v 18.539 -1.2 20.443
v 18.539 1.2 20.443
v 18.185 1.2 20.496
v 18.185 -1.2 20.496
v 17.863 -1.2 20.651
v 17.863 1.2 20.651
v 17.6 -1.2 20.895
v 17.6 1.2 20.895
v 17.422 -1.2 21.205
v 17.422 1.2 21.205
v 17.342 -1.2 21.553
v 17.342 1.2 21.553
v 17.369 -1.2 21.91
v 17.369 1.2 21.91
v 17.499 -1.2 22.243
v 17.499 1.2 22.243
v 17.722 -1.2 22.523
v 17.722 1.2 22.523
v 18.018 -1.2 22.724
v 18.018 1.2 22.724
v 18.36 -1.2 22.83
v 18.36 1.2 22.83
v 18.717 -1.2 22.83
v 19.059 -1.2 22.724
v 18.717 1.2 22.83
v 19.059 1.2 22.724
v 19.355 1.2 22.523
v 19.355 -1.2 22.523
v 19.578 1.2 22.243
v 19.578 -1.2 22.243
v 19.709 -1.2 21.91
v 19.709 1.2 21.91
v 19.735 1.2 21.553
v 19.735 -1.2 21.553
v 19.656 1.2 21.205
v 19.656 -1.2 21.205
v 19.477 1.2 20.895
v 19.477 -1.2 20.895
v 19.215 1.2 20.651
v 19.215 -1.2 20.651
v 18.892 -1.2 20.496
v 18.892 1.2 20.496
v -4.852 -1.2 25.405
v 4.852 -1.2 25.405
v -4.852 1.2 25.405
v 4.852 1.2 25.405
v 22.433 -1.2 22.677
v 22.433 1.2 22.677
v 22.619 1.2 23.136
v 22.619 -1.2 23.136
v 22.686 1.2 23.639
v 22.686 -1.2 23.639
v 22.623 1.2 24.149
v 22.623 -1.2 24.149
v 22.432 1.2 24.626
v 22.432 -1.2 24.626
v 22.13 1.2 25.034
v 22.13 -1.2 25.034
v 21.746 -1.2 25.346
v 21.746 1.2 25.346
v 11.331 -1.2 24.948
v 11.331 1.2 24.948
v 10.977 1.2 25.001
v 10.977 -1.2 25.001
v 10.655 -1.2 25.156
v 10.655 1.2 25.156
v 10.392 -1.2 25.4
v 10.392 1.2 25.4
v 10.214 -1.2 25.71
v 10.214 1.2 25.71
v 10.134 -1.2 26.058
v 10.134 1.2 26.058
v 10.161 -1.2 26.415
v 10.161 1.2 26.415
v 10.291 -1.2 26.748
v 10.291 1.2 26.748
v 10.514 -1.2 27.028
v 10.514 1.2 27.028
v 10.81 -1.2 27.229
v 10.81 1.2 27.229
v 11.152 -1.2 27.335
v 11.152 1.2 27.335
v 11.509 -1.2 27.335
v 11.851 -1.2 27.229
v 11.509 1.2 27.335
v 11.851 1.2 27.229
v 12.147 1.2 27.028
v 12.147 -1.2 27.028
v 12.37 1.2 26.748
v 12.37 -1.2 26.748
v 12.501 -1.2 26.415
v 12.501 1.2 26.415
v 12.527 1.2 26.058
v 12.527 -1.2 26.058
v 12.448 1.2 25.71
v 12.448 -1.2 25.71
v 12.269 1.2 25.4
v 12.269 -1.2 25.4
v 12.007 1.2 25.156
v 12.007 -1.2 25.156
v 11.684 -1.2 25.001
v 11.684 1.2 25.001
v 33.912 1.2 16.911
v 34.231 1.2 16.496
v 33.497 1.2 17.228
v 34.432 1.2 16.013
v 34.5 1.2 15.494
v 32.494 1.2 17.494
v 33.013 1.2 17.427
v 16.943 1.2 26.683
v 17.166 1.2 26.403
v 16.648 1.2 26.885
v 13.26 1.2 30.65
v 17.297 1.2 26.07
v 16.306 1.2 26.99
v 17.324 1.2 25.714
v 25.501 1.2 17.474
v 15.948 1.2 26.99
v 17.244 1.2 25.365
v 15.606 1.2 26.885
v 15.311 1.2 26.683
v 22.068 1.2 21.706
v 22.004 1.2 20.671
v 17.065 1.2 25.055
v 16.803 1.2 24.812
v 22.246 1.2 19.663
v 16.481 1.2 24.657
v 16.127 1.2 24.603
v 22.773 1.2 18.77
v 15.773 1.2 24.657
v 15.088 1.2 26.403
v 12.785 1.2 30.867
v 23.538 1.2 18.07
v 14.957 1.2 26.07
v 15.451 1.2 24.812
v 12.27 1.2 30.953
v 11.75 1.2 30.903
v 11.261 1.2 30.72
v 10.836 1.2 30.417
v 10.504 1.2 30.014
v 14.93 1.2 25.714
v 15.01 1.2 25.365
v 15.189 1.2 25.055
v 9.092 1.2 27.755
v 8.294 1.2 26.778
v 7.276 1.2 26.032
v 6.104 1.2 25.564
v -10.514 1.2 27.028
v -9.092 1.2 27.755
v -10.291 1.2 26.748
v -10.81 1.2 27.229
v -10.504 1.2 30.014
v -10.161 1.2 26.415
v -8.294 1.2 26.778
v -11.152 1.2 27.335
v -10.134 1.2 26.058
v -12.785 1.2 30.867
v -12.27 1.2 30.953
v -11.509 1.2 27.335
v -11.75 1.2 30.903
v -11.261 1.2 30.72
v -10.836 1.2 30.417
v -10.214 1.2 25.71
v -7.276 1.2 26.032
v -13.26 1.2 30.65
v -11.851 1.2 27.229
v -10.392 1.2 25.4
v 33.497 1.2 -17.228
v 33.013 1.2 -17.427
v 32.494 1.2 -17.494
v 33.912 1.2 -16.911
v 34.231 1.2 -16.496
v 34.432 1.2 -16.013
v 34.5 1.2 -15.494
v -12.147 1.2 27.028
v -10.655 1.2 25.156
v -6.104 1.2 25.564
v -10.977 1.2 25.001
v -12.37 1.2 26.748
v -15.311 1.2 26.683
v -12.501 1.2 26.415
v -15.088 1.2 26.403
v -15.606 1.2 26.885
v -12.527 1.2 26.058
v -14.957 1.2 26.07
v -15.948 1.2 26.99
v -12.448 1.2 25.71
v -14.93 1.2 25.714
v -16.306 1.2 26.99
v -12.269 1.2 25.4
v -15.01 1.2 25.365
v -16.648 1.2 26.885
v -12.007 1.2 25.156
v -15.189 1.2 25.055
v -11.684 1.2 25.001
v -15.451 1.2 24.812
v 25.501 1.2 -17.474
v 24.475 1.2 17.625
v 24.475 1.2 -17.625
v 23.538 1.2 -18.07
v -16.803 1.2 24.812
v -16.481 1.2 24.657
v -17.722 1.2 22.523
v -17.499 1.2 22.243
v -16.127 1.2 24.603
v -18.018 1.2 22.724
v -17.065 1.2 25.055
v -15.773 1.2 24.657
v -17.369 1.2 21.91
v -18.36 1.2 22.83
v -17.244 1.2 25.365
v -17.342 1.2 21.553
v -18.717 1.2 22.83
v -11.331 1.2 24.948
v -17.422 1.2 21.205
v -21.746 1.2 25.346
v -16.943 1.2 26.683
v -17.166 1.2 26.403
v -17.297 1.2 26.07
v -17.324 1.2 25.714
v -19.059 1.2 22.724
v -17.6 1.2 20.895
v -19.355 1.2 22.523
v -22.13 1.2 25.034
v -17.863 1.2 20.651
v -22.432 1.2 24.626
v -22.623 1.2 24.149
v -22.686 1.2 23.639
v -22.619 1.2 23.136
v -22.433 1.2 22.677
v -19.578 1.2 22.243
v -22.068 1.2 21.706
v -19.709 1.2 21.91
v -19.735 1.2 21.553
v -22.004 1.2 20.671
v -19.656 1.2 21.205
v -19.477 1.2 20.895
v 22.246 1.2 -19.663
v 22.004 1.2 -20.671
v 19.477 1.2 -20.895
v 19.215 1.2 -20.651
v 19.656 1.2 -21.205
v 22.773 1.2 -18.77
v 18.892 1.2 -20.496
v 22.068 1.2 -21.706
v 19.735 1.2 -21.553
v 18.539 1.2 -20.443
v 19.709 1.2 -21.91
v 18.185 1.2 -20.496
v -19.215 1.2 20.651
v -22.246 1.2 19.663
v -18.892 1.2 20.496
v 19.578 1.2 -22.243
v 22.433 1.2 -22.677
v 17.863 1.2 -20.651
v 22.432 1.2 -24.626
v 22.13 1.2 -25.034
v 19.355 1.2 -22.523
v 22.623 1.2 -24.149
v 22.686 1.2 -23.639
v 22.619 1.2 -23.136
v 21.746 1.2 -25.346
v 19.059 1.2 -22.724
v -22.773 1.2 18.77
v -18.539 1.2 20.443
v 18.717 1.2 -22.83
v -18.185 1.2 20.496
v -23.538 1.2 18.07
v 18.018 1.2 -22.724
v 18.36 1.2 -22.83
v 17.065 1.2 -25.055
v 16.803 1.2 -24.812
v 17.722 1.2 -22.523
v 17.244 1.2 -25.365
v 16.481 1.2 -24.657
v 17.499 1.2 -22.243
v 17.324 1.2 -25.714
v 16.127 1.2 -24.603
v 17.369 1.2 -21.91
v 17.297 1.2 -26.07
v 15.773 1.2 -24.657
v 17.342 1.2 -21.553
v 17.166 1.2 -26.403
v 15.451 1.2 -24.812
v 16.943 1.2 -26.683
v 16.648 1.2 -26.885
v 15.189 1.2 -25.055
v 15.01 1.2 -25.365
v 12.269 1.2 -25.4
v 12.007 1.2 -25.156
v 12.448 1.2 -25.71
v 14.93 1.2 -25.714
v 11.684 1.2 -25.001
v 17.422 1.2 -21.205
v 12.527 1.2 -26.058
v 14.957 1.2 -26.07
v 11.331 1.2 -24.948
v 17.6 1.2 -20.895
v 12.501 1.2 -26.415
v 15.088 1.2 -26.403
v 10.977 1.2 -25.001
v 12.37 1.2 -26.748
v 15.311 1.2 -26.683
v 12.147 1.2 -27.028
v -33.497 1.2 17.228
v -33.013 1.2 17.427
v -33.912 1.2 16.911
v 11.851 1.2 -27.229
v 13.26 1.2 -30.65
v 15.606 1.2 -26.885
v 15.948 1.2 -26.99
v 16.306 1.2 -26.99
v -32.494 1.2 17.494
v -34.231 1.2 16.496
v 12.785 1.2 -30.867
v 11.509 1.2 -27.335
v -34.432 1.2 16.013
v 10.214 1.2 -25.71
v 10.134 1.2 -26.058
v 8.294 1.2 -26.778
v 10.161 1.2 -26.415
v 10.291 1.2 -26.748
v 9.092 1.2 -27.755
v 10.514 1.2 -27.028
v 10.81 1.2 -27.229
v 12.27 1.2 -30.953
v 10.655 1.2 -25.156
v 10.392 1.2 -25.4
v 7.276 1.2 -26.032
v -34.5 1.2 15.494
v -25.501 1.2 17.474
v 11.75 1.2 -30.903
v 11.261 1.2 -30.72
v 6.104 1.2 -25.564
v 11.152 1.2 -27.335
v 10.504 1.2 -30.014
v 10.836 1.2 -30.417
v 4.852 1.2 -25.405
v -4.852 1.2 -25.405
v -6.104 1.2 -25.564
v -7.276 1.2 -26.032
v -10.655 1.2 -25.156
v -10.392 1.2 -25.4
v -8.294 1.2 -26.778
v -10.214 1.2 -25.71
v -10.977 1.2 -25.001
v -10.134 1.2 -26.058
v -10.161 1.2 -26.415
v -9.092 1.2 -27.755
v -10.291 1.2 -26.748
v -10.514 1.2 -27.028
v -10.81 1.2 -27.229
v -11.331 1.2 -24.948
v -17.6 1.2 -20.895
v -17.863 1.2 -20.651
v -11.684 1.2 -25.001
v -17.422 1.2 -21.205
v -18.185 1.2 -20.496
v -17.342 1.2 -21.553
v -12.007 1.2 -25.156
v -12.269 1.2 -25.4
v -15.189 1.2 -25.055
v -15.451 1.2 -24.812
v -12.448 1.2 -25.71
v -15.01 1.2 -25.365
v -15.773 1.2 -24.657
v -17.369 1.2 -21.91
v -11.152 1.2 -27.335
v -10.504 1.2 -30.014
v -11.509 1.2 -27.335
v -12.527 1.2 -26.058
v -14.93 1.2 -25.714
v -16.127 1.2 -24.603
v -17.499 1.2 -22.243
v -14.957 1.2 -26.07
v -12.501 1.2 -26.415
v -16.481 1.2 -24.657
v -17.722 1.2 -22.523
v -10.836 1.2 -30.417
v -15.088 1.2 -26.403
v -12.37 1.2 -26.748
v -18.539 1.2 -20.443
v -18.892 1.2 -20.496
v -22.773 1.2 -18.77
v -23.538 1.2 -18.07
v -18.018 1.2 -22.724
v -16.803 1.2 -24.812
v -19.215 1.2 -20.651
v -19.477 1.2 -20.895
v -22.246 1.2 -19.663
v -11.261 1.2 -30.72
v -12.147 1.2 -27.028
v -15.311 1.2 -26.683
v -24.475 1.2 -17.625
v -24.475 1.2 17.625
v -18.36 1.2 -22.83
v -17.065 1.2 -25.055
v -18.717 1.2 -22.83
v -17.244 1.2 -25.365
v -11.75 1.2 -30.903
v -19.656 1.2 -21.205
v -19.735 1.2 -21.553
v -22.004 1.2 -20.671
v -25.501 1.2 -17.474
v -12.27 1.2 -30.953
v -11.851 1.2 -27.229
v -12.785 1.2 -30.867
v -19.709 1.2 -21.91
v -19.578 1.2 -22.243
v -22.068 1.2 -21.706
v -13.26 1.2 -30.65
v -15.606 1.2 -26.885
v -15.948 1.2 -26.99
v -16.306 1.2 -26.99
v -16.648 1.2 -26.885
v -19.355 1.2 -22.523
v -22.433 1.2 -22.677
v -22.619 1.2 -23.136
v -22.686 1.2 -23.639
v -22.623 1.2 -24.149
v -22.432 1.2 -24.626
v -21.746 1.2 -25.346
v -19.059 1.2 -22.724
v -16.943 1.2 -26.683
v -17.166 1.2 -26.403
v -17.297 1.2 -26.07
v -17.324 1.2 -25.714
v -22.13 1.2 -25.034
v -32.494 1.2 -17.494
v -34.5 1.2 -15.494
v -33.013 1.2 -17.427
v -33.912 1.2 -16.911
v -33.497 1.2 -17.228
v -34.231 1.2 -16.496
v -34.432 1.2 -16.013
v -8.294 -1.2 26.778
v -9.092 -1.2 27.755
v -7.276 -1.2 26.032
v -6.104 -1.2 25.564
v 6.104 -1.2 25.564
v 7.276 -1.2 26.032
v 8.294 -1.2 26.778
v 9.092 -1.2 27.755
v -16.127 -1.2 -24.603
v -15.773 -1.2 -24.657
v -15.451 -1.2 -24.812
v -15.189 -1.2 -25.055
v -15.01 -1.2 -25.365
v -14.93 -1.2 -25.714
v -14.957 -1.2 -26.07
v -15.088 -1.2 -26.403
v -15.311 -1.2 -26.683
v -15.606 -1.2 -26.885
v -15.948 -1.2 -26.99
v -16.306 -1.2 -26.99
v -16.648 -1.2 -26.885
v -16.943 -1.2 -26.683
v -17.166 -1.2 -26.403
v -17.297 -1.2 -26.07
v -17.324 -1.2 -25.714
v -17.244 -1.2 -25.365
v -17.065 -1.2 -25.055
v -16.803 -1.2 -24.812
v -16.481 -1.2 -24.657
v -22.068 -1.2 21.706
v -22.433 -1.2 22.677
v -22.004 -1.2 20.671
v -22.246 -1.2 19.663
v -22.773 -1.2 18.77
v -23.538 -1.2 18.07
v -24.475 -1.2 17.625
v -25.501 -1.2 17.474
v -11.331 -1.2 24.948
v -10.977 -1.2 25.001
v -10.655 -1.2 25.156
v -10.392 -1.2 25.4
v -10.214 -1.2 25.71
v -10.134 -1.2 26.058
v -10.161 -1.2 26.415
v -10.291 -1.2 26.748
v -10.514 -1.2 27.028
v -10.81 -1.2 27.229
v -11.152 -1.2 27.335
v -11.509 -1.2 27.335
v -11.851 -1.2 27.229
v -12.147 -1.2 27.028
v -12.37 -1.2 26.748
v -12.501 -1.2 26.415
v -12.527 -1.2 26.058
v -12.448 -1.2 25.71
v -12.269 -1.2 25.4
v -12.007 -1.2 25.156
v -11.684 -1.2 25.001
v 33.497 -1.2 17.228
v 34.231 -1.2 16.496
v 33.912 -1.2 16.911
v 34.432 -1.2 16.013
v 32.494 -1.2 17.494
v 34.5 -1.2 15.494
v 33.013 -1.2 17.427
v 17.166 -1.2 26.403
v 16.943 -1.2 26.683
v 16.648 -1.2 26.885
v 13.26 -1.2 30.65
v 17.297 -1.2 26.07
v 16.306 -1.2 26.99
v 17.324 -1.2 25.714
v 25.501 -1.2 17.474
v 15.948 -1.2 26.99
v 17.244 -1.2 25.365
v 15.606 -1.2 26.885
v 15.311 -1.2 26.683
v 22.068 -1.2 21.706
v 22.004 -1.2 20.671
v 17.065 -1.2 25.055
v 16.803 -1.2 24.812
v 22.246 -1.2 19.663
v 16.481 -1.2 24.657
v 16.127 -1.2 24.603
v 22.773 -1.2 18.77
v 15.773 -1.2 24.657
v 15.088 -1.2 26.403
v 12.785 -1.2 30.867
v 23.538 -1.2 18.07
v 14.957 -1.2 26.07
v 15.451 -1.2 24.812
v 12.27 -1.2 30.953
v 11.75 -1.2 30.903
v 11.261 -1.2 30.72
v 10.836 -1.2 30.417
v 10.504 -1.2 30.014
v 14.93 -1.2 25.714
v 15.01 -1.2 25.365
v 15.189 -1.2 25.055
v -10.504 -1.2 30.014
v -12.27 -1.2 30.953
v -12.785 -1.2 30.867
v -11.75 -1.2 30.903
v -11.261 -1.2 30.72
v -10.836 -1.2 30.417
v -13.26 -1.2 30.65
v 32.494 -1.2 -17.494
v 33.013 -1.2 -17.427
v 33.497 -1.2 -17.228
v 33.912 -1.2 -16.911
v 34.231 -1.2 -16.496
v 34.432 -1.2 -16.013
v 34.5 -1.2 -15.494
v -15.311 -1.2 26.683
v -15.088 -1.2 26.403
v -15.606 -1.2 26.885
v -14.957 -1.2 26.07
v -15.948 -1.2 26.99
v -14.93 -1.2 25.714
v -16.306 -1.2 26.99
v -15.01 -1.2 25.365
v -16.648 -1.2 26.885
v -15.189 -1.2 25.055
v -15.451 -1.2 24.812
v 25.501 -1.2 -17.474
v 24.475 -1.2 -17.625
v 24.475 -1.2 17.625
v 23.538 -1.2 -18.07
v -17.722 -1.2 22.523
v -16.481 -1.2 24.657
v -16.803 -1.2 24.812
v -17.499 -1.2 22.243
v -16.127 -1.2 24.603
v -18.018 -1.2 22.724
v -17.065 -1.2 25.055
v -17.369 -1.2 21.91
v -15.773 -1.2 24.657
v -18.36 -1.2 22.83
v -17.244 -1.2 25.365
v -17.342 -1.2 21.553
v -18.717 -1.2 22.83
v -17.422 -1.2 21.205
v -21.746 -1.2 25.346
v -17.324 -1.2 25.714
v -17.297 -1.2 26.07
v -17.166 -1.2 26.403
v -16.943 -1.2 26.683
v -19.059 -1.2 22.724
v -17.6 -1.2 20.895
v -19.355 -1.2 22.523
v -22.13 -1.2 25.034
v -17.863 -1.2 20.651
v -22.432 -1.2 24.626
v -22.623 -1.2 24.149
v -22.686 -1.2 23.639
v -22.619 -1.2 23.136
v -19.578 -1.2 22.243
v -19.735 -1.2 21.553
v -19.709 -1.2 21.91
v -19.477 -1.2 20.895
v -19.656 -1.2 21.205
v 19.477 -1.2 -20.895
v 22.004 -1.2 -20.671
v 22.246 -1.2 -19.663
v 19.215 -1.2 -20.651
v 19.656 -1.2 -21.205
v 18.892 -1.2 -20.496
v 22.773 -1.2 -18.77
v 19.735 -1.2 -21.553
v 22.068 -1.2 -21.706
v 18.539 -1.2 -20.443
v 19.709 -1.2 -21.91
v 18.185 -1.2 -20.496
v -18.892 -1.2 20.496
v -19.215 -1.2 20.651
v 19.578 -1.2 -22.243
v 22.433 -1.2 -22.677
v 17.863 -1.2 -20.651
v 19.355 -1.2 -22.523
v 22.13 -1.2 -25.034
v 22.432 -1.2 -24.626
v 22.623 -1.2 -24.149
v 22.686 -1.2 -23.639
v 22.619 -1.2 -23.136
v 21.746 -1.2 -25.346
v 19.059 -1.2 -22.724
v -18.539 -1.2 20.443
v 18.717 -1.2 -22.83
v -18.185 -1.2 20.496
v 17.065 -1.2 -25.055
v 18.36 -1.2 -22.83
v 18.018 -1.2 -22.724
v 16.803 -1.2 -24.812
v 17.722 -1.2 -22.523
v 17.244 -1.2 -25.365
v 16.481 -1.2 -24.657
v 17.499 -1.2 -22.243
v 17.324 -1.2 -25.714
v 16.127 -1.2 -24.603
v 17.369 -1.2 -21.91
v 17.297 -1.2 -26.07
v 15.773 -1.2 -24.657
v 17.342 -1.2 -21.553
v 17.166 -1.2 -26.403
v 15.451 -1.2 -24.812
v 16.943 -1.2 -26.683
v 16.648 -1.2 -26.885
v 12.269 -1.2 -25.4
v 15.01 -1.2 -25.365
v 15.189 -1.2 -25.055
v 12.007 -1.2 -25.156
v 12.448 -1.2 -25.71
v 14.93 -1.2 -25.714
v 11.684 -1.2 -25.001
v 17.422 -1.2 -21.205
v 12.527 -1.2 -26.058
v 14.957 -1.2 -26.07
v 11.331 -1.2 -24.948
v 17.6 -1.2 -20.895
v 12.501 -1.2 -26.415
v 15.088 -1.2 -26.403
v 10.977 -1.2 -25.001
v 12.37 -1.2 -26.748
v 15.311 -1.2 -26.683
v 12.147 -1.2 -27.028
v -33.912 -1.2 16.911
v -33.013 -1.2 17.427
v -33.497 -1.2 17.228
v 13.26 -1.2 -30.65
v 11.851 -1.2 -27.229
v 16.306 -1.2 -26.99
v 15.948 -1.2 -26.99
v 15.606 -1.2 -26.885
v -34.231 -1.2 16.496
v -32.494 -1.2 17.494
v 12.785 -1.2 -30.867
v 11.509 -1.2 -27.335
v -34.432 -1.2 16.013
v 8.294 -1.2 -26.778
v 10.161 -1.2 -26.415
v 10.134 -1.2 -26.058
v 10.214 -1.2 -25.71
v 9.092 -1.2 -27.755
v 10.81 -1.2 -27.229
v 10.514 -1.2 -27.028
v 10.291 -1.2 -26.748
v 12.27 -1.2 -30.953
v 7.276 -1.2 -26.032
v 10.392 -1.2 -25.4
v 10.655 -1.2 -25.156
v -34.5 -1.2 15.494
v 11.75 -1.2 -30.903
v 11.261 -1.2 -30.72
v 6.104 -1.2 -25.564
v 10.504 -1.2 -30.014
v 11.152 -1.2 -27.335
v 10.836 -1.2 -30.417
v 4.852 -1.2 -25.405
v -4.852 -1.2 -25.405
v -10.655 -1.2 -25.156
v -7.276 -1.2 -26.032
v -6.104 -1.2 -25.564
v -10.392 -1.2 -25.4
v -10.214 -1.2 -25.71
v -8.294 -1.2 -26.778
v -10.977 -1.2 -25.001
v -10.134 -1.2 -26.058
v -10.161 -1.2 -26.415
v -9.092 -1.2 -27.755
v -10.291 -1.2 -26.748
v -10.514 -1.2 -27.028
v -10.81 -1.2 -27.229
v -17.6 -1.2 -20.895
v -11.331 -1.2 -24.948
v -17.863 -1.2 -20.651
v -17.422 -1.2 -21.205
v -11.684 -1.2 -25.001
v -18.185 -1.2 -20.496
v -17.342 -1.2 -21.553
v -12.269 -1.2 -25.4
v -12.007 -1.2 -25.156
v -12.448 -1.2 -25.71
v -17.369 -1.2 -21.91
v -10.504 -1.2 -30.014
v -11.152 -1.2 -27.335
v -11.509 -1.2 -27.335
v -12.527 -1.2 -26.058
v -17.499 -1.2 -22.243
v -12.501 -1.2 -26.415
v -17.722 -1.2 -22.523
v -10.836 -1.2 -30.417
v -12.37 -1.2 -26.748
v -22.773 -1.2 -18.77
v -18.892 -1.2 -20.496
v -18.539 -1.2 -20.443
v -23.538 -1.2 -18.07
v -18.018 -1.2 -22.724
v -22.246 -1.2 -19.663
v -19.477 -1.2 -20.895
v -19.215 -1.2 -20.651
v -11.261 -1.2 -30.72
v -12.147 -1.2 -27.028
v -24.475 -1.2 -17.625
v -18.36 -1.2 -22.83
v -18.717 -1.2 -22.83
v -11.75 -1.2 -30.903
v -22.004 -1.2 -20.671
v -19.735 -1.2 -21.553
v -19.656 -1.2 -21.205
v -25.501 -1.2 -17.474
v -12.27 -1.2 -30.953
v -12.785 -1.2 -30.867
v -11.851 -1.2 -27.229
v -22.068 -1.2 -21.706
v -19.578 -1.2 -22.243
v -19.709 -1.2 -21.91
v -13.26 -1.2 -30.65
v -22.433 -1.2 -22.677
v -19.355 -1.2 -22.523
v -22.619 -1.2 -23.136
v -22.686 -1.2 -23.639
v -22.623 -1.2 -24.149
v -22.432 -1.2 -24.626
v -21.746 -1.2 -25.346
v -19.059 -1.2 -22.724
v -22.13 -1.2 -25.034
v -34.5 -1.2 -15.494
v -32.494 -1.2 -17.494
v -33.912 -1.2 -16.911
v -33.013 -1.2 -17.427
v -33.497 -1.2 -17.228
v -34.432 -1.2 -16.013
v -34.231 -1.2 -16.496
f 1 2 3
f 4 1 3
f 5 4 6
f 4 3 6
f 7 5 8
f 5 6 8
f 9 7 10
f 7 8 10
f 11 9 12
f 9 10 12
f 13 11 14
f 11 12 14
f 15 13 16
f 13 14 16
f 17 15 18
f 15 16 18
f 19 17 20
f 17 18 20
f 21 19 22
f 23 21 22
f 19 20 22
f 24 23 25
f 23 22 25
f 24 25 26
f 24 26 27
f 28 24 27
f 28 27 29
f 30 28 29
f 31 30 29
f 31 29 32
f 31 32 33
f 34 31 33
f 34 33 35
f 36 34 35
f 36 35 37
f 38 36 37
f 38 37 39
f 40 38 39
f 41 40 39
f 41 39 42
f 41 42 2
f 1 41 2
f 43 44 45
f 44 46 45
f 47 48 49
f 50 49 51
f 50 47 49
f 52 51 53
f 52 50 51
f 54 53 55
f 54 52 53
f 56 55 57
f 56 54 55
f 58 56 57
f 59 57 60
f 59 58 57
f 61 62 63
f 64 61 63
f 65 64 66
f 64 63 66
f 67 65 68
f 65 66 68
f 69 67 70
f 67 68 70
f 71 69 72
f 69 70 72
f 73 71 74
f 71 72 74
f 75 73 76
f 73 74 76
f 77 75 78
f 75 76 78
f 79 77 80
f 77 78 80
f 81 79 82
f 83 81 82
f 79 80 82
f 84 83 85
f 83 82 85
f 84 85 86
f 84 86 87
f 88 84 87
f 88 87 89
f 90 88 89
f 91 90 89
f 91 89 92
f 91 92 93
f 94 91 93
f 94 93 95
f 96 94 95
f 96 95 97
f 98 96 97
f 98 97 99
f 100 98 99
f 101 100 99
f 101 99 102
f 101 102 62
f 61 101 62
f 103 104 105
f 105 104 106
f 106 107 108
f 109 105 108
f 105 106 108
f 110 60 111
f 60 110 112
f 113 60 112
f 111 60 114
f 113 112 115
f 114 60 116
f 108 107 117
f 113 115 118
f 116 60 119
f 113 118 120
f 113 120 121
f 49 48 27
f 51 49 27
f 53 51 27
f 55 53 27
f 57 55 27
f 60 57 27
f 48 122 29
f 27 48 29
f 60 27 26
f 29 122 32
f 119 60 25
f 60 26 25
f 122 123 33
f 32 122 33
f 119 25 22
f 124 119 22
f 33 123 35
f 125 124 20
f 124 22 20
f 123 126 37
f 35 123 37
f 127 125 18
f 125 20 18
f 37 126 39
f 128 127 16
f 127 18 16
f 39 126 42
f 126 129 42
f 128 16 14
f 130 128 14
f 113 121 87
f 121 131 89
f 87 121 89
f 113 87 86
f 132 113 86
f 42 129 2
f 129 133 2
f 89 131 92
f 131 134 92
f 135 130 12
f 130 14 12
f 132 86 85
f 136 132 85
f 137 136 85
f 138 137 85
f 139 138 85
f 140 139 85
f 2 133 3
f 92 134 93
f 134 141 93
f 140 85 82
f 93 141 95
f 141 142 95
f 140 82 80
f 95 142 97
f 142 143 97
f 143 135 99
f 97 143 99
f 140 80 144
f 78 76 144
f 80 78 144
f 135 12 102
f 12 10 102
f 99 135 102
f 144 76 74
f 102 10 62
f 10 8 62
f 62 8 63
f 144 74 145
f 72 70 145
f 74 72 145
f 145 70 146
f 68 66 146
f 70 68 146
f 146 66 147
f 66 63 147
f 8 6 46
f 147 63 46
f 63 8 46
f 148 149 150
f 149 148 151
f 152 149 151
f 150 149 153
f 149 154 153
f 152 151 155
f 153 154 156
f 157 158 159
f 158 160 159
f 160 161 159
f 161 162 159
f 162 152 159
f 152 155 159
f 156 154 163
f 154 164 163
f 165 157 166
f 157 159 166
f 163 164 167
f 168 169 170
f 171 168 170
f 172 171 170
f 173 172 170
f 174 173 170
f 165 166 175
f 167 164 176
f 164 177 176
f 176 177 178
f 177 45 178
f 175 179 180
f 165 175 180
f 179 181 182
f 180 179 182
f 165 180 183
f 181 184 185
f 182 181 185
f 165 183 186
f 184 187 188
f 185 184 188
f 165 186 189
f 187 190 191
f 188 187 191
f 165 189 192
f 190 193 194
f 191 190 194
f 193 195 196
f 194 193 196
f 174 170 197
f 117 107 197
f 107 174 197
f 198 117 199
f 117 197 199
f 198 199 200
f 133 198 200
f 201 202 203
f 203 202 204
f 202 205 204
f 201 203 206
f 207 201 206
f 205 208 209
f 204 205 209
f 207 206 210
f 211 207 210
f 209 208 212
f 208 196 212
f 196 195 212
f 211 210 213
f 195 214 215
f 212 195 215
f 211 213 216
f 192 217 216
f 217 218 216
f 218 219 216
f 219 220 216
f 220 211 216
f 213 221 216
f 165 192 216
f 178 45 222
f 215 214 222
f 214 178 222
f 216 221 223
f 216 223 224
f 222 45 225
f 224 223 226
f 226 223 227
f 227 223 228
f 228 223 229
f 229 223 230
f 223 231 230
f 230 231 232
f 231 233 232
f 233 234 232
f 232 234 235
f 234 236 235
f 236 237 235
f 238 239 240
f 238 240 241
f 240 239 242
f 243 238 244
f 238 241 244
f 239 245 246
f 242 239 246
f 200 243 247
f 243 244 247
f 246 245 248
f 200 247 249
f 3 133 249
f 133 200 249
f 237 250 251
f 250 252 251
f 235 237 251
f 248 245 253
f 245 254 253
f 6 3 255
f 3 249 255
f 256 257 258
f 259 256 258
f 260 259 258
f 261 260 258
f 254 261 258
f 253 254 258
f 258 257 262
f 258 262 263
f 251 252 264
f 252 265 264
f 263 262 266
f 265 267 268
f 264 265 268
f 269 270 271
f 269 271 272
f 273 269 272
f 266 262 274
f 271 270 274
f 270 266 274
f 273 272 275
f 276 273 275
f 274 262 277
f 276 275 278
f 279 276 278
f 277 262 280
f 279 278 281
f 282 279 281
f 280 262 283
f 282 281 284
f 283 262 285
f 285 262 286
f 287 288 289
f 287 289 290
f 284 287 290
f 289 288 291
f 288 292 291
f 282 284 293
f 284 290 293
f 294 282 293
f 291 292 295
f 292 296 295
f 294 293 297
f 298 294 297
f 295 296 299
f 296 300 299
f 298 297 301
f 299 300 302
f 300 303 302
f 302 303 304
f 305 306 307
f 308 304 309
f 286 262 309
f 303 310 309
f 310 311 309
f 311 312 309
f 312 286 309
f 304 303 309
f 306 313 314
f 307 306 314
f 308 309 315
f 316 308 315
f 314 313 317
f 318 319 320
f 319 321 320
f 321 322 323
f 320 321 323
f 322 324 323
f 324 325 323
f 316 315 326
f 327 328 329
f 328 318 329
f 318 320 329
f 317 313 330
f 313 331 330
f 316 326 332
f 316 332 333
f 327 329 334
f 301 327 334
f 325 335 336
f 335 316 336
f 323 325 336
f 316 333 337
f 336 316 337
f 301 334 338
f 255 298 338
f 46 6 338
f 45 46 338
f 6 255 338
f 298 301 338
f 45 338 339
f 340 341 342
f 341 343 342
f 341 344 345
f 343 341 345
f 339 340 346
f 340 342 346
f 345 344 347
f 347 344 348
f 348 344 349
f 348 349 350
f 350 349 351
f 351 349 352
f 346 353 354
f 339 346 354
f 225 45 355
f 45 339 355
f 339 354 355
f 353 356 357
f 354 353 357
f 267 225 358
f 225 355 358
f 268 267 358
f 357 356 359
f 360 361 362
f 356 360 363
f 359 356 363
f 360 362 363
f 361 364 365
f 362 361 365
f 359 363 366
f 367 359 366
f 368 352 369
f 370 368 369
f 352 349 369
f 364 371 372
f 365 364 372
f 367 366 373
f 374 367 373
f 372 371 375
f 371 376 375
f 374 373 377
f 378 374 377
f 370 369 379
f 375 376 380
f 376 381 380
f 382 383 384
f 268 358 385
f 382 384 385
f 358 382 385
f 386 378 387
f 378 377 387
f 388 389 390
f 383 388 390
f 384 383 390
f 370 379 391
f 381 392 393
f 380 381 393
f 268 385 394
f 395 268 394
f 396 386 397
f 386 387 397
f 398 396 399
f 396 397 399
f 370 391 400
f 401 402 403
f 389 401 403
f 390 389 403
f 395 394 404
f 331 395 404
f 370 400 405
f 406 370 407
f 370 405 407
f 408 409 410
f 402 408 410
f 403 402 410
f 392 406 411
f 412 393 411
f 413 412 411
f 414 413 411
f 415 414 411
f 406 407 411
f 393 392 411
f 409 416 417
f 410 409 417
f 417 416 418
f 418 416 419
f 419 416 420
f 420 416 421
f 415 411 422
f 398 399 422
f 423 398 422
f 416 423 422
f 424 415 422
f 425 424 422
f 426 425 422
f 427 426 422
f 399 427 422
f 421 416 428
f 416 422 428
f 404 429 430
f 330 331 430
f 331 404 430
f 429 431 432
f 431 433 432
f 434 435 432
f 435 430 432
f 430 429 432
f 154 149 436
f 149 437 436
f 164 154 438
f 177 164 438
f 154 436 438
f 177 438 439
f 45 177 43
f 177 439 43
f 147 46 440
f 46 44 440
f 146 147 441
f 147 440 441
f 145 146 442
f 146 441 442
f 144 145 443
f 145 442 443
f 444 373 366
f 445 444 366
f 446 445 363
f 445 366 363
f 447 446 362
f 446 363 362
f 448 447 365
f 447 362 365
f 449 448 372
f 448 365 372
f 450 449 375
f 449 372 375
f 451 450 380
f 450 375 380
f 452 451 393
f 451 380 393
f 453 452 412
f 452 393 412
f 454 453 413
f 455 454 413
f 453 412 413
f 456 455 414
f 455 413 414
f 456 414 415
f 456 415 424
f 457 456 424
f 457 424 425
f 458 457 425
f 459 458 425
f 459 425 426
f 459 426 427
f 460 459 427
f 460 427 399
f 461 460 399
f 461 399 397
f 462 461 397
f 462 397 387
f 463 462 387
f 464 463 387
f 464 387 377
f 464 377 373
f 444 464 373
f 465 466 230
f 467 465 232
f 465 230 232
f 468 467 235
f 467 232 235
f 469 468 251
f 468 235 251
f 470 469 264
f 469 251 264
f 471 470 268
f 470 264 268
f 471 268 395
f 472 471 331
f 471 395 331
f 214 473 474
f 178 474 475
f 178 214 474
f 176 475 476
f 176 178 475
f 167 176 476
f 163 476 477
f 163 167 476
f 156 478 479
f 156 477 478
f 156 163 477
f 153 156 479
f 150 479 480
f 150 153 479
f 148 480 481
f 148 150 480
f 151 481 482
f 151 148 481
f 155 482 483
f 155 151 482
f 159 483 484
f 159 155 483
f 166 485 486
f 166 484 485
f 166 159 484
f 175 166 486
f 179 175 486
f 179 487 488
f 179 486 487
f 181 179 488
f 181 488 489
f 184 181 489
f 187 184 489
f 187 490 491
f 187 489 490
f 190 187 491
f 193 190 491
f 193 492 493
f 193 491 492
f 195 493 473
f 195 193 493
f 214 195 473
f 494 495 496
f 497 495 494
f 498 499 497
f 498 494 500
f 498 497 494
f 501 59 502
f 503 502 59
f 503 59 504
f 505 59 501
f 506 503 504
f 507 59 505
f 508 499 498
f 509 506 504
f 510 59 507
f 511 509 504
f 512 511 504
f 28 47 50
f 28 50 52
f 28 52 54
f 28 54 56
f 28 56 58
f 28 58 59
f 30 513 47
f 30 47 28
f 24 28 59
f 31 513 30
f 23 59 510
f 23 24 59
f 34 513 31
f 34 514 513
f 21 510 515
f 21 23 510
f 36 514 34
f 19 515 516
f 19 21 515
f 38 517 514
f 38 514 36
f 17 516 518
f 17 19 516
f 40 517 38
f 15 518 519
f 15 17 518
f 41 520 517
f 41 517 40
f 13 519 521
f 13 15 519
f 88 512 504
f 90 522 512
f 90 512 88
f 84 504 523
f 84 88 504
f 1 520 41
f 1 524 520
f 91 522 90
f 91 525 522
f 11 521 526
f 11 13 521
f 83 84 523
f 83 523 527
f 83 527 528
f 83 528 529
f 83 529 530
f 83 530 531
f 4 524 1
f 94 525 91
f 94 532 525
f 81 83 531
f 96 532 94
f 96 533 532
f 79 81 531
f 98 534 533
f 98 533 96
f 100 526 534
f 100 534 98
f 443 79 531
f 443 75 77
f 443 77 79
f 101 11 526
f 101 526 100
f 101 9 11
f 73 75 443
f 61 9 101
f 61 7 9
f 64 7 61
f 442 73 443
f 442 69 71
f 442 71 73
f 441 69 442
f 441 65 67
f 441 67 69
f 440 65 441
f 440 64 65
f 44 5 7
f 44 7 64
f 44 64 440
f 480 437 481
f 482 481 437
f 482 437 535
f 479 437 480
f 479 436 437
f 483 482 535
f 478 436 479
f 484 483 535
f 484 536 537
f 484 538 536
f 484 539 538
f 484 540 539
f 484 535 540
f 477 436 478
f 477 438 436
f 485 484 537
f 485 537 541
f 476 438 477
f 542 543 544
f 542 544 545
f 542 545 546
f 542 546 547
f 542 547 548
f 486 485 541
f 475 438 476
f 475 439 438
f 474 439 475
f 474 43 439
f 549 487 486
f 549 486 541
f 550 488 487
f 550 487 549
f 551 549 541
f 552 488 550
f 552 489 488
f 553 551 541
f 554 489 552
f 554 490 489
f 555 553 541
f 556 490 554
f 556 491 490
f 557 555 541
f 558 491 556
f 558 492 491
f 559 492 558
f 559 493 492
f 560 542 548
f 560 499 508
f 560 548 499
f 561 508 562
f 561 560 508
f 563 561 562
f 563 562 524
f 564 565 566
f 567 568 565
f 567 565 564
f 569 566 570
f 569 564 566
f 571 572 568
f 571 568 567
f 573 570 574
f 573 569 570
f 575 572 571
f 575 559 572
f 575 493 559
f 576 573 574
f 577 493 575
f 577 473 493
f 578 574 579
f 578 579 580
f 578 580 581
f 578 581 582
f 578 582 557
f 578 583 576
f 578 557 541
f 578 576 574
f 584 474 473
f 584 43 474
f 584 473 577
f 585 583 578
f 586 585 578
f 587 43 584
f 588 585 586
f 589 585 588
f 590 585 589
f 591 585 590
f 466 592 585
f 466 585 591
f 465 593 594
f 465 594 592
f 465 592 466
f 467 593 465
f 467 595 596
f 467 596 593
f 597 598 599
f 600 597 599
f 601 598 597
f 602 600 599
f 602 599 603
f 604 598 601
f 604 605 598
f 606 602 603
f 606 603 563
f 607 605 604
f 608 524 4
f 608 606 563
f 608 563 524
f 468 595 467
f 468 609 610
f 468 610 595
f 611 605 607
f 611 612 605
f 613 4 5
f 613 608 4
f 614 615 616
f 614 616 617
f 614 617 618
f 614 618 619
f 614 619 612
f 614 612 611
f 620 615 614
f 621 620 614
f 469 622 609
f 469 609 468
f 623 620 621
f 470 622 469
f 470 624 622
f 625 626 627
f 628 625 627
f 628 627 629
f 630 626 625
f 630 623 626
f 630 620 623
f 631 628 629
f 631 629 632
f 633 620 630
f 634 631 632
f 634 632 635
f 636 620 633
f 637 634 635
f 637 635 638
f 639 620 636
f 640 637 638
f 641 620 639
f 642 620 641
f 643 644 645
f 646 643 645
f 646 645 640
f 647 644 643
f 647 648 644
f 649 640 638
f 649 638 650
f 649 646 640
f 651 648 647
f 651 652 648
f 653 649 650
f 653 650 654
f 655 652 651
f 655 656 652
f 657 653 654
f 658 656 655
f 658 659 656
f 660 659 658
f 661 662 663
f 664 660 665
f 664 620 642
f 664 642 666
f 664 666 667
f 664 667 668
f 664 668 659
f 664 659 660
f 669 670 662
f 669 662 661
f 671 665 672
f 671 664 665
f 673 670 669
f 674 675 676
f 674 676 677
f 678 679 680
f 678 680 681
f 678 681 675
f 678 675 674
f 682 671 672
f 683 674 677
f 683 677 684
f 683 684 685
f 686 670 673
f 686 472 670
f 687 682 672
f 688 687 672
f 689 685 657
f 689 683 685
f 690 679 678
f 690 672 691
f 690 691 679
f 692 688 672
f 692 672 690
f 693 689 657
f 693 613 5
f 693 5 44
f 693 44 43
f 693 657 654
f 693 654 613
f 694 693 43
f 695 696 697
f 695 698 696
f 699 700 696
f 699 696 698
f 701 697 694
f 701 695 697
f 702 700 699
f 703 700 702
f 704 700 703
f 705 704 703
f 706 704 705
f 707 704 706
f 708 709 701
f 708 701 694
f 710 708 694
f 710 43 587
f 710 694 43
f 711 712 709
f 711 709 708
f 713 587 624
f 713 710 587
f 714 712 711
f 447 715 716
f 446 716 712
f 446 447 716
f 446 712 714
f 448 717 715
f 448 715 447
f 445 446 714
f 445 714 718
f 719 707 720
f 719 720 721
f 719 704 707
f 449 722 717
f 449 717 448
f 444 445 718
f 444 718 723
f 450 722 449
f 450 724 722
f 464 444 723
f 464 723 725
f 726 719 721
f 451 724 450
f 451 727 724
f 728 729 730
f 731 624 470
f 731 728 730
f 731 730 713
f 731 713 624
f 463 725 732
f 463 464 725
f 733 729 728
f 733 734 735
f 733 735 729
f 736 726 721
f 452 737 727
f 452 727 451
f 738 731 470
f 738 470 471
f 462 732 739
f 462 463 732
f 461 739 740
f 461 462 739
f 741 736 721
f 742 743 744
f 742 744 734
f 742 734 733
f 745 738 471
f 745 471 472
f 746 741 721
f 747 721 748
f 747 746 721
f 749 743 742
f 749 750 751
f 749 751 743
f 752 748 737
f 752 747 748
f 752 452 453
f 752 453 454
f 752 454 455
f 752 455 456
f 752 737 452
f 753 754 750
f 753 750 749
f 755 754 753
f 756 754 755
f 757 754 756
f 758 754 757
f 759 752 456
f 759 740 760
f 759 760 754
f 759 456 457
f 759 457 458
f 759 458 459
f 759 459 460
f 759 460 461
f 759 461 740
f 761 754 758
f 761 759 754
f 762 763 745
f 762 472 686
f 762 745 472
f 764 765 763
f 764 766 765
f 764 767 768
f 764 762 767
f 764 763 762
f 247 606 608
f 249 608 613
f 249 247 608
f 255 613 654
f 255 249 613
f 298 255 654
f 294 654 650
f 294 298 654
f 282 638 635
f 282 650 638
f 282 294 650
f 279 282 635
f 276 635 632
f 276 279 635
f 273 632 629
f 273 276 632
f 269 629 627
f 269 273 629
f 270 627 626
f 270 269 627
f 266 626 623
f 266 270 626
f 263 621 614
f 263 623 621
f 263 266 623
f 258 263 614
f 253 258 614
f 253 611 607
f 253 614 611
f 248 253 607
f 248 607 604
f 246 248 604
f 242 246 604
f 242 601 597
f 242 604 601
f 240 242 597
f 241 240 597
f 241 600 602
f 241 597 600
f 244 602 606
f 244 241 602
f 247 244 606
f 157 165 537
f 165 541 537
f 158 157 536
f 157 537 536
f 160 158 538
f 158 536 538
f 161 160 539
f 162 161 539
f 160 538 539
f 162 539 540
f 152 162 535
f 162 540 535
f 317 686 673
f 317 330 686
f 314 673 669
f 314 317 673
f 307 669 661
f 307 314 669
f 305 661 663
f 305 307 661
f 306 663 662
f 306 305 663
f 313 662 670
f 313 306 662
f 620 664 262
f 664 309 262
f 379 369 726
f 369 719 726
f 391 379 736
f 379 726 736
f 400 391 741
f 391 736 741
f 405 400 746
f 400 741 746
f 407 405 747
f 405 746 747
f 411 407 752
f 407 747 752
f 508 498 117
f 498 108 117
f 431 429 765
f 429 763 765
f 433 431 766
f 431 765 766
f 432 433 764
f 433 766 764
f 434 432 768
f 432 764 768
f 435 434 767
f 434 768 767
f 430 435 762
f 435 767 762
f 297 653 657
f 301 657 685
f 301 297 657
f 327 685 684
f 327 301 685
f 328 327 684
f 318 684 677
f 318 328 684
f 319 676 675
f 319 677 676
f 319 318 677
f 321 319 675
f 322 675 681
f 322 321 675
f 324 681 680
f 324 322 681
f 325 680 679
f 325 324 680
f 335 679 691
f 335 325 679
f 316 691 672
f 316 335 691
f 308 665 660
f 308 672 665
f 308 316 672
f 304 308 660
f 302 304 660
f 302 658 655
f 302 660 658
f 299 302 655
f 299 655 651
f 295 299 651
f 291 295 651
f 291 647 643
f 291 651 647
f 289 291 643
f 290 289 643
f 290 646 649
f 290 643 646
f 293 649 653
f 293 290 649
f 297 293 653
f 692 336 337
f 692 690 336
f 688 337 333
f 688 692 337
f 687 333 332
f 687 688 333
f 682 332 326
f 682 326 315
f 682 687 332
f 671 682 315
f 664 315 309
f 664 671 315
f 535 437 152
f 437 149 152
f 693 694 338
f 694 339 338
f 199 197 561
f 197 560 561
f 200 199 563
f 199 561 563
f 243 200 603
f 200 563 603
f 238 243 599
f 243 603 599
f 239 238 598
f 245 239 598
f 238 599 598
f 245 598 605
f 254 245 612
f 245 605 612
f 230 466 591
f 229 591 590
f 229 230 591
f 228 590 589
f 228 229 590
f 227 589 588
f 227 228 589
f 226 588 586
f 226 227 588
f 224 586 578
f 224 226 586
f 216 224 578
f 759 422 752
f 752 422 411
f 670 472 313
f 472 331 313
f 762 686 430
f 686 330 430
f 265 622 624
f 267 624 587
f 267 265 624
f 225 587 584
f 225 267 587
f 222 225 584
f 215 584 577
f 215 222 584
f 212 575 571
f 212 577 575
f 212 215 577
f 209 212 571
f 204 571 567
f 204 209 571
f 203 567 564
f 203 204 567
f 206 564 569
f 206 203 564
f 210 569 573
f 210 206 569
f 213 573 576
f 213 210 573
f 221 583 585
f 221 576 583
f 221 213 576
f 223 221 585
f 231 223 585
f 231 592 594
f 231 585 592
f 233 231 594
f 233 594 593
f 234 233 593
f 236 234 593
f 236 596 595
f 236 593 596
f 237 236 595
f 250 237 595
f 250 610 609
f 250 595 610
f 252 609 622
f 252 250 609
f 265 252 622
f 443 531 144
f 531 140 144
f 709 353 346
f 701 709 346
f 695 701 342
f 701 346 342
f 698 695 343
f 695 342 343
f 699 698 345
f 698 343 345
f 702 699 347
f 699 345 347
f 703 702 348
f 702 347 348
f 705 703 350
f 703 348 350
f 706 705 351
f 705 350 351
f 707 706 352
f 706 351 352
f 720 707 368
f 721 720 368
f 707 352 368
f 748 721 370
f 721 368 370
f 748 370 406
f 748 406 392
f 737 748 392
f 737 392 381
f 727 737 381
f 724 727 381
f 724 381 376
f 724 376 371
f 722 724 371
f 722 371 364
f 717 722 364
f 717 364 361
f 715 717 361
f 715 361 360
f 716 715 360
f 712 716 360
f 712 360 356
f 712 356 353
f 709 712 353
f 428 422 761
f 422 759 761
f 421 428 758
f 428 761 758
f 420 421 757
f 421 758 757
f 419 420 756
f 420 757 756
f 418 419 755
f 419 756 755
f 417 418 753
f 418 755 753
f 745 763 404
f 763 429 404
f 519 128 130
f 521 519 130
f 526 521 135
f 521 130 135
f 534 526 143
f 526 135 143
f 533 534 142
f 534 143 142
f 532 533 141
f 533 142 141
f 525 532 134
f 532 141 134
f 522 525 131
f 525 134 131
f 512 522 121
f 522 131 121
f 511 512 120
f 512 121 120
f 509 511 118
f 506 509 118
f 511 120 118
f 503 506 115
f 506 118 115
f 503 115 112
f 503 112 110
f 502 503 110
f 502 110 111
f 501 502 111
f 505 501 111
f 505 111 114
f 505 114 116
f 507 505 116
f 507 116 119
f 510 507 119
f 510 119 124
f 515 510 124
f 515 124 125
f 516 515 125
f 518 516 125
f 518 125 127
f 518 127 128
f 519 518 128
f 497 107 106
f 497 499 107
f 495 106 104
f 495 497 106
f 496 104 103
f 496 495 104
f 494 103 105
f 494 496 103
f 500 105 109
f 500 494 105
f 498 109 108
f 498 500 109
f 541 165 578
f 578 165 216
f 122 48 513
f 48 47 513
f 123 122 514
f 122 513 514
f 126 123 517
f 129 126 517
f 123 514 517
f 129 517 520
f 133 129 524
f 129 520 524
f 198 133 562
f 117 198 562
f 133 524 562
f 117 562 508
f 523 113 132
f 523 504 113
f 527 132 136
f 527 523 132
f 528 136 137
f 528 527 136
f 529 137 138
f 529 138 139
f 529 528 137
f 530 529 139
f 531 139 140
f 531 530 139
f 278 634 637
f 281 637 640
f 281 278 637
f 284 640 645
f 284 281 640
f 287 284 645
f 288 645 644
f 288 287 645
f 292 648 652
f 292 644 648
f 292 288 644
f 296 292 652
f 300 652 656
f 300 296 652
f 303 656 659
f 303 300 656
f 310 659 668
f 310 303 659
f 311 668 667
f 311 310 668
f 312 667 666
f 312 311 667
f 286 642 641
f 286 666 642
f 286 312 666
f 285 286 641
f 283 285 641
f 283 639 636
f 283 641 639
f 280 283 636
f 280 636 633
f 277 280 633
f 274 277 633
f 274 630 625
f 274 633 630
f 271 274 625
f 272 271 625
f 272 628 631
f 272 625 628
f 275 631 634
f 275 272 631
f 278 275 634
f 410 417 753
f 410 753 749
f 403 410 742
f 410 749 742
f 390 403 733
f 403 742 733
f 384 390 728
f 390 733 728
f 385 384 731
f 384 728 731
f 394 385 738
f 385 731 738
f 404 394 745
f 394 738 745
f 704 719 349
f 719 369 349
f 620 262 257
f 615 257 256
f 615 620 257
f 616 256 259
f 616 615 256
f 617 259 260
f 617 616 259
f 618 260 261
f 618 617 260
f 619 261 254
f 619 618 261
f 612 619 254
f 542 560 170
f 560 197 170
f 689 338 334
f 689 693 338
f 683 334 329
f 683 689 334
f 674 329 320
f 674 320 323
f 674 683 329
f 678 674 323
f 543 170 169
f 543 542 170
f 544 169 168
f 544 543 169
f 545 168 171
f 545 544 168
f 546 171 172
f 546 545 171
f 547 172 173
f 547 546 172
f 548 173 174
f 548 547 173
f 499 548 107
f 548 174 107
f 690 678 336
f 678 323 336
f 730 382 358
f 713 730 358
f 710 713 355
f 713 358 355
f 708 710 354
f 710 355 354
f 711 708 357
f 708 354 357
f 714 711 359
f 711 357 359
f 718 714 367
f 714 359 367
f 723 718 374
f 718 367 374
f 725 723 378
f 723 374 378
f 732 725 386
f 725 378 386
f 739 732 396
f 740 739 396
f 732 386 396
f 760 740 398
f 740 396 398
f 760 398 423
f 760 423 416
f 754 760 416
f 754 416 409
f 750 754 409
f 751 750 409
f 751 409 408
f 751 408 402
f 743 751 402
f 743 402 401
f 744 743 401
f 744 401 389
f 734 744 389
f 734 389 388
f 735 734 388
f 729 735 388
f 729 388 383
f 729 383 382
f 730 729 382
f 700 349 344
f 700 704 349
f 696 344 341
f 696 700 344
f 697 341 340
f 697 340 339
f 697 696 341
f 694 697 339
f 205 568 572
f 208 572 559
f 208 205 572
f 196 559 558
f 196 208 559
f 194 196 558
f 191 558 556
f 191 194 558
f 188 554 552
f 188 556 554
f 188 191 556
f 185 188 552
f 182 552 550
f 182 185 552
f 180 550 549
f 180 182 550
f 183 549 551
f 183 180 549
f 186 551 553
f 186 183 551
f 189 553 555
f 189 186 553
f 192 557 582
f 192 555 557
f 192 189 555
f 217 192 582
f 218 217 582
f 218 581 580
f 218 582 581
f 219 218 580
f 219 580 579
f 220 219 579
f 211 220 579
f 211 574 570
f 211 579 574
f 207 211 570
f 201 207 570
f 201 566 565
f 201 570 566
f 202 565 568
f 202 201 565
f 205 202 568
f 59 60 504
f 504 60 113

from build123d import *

# Parameters (mm, degrees)
BOSS_EXTRUDE1_DEPTH     = 1.2
FILLET1_R               = 3.5
FILLET2_R               = 5
FILLET3_R               = 2
SKETCH3_R               = 1.2
CUT_EXTRUDE1_DEPTH      = 47.412929356
MIRROR2_COPY_1_SKETCH_R = 1.2
MIRROR2_COPY_1_DEPTH    = 47.412929356


with BuildPart() as part:
    # Sketch2 → Boss-Extrude1 (new, symmetric)
    with BuildSketch(Plane(origin=(0, 0, 0), x_dir=(1, 0, 0), z_dir=(0, 1, 0))):
        Polygon((-34.5, -17.5), (-34.5, 17.5), (-19.164918189, 17.456295518), (-23.435988128, 24.29000742), (-11.564011872, 31.70999258), (-7.623299146, 25.404852218), (7.623299146, 25.404852218), (11.564011872, 31.70999258), (23.435988128, 24.29000742), (19.164918189, 17.456295518), (34.5, 17.5), (34.5, -17.5), (19.164918189, -17.456295518), (23.435988128, -24.29000742), (11.564011872, -31.70999258), (7.623299146, -25.404852218), (-7.623299146, -25.404852218), (-11.564011872, -31.70999258), (-23.435988128, -24.29000742), (-19.164918189, -17.456295518), align=None)
    extrude(amount=BOSS_EXTRUDE1_DEPTH, both=True)

    # Fillet1
    fillet1_edges = [part.edges().sort_by_distance(p)[0] for p in [
        (-19.164918189, 0, -17.456295518),
        (19.164918189, 0, -17.456295518),
        (19.164918189, 0, 17.456295518),
        (-19.164918189, 0, 17.456295518),
    ]]
    fillet(fillet1_edges, radius=FILLET1_R)

    # Fillet2
    fillet2_edges = [part.edges().sort_by_distance(p)[0] for p in [
        (-7.623299146, 0, -25.404852218),
        (7.623299146, 0, -25.404852218),
        (7.623299146, 0, 25.404852218),
        (-7.623299146, 0, 25.404852218),
    ]]
    fillet(fillet2_edges, radius=FILLET2_R)

    # Fillet3
    fillet3_edges = [part.edges().sort_by_distance(p)[0] for p in [
        (34.5, 0, -17.5),
        (23.435988128, 0, -24.29000742),
        (34.5, 0, 17.5),
        (23.435988128, 0, 24.29000742),
        (11.564011872, 0, 31.70999258),
        (11.564011872, 0, -31.70999258),
        (-11.564011872, 0, -31.70999258),
        (-23.435988128, 0, -24.29000742),
        (-34.5, 0, -17.5),
        (-34.5, 0, 17.5),
        (-11.564011872, 0, 31.70999258),
        (-23.435988128, 0, 24.29000742),
    ]]
    fillet(fillet3_edges, radius=FILLET3_R)

    # Sketch3 → Cut-Extrude1 (cut, through all)
    with BuildSketch(Plane(origin=(0, 1.2, 0), x_dir=(1, 0, 0), z_dir=(0, 1, 0))):
        with Locations(Location((-16.127132138, 25.803411421, 0), (0, 0, 270))):
            Circle(SKETCH3_R)
        with Locations(Location((-11.330641731, 26.147910732, 0), (0, 0, 270))):
            Circle(SKETCH3_R)
        with Locations(Location((-18.538627315, 21.642919742, 0), (0, 0, 270))):
            Circle(SKETCH3_R)
    cut_extrude1 = extrude(amount=-CUT_EXTRUDE1_DEPTH, mode=Mode.SUBTRACT)

    # Mirror1: Cut-Extrude1 across plane
    add(cut_extrude1.mirror(Plane(origin=(0, 0, 0), x_dir=(0, 0, 1), z_dir=(1, 0, 0))), mode=Mode.SUBTRACT)

    # Mirror2: Cut-Extrude1 across plane
    add(cut_extrude1.mirror(Plane.XY), mode=Mode.SUBTRACT)

    # Mirror2 copy 1 sketch → Mirror2 copy 1 (cut, through all)
    with BuildSketch(Plane(origin=(0, 1.2, 0), x_dir=(-1, 0, 0), z_dir=(0, 1, 0))):
        with Locations(Location((-16.127132138, 25.803411421, 0), (0, 0, 270))):
            Circle(MIRROR2_COPY_1_SKETCH_R)
        with Locations(Location((-11.330641731, 26.147910732, 0), (0, 0, 270))):
            Circle(MIRROR2_COPY_1_SKETCH_R)
        with Locations(Location((-18.538627315, 21.642919742, 0), (0, 0, 270))):
            Circle(MIRROR2_COPY_1_SKETCH_R)
    extrude(amount=-MIRROR2_COPY_1_DEPTH, mode=Mode.SUBTRACT)


solid = part.part
